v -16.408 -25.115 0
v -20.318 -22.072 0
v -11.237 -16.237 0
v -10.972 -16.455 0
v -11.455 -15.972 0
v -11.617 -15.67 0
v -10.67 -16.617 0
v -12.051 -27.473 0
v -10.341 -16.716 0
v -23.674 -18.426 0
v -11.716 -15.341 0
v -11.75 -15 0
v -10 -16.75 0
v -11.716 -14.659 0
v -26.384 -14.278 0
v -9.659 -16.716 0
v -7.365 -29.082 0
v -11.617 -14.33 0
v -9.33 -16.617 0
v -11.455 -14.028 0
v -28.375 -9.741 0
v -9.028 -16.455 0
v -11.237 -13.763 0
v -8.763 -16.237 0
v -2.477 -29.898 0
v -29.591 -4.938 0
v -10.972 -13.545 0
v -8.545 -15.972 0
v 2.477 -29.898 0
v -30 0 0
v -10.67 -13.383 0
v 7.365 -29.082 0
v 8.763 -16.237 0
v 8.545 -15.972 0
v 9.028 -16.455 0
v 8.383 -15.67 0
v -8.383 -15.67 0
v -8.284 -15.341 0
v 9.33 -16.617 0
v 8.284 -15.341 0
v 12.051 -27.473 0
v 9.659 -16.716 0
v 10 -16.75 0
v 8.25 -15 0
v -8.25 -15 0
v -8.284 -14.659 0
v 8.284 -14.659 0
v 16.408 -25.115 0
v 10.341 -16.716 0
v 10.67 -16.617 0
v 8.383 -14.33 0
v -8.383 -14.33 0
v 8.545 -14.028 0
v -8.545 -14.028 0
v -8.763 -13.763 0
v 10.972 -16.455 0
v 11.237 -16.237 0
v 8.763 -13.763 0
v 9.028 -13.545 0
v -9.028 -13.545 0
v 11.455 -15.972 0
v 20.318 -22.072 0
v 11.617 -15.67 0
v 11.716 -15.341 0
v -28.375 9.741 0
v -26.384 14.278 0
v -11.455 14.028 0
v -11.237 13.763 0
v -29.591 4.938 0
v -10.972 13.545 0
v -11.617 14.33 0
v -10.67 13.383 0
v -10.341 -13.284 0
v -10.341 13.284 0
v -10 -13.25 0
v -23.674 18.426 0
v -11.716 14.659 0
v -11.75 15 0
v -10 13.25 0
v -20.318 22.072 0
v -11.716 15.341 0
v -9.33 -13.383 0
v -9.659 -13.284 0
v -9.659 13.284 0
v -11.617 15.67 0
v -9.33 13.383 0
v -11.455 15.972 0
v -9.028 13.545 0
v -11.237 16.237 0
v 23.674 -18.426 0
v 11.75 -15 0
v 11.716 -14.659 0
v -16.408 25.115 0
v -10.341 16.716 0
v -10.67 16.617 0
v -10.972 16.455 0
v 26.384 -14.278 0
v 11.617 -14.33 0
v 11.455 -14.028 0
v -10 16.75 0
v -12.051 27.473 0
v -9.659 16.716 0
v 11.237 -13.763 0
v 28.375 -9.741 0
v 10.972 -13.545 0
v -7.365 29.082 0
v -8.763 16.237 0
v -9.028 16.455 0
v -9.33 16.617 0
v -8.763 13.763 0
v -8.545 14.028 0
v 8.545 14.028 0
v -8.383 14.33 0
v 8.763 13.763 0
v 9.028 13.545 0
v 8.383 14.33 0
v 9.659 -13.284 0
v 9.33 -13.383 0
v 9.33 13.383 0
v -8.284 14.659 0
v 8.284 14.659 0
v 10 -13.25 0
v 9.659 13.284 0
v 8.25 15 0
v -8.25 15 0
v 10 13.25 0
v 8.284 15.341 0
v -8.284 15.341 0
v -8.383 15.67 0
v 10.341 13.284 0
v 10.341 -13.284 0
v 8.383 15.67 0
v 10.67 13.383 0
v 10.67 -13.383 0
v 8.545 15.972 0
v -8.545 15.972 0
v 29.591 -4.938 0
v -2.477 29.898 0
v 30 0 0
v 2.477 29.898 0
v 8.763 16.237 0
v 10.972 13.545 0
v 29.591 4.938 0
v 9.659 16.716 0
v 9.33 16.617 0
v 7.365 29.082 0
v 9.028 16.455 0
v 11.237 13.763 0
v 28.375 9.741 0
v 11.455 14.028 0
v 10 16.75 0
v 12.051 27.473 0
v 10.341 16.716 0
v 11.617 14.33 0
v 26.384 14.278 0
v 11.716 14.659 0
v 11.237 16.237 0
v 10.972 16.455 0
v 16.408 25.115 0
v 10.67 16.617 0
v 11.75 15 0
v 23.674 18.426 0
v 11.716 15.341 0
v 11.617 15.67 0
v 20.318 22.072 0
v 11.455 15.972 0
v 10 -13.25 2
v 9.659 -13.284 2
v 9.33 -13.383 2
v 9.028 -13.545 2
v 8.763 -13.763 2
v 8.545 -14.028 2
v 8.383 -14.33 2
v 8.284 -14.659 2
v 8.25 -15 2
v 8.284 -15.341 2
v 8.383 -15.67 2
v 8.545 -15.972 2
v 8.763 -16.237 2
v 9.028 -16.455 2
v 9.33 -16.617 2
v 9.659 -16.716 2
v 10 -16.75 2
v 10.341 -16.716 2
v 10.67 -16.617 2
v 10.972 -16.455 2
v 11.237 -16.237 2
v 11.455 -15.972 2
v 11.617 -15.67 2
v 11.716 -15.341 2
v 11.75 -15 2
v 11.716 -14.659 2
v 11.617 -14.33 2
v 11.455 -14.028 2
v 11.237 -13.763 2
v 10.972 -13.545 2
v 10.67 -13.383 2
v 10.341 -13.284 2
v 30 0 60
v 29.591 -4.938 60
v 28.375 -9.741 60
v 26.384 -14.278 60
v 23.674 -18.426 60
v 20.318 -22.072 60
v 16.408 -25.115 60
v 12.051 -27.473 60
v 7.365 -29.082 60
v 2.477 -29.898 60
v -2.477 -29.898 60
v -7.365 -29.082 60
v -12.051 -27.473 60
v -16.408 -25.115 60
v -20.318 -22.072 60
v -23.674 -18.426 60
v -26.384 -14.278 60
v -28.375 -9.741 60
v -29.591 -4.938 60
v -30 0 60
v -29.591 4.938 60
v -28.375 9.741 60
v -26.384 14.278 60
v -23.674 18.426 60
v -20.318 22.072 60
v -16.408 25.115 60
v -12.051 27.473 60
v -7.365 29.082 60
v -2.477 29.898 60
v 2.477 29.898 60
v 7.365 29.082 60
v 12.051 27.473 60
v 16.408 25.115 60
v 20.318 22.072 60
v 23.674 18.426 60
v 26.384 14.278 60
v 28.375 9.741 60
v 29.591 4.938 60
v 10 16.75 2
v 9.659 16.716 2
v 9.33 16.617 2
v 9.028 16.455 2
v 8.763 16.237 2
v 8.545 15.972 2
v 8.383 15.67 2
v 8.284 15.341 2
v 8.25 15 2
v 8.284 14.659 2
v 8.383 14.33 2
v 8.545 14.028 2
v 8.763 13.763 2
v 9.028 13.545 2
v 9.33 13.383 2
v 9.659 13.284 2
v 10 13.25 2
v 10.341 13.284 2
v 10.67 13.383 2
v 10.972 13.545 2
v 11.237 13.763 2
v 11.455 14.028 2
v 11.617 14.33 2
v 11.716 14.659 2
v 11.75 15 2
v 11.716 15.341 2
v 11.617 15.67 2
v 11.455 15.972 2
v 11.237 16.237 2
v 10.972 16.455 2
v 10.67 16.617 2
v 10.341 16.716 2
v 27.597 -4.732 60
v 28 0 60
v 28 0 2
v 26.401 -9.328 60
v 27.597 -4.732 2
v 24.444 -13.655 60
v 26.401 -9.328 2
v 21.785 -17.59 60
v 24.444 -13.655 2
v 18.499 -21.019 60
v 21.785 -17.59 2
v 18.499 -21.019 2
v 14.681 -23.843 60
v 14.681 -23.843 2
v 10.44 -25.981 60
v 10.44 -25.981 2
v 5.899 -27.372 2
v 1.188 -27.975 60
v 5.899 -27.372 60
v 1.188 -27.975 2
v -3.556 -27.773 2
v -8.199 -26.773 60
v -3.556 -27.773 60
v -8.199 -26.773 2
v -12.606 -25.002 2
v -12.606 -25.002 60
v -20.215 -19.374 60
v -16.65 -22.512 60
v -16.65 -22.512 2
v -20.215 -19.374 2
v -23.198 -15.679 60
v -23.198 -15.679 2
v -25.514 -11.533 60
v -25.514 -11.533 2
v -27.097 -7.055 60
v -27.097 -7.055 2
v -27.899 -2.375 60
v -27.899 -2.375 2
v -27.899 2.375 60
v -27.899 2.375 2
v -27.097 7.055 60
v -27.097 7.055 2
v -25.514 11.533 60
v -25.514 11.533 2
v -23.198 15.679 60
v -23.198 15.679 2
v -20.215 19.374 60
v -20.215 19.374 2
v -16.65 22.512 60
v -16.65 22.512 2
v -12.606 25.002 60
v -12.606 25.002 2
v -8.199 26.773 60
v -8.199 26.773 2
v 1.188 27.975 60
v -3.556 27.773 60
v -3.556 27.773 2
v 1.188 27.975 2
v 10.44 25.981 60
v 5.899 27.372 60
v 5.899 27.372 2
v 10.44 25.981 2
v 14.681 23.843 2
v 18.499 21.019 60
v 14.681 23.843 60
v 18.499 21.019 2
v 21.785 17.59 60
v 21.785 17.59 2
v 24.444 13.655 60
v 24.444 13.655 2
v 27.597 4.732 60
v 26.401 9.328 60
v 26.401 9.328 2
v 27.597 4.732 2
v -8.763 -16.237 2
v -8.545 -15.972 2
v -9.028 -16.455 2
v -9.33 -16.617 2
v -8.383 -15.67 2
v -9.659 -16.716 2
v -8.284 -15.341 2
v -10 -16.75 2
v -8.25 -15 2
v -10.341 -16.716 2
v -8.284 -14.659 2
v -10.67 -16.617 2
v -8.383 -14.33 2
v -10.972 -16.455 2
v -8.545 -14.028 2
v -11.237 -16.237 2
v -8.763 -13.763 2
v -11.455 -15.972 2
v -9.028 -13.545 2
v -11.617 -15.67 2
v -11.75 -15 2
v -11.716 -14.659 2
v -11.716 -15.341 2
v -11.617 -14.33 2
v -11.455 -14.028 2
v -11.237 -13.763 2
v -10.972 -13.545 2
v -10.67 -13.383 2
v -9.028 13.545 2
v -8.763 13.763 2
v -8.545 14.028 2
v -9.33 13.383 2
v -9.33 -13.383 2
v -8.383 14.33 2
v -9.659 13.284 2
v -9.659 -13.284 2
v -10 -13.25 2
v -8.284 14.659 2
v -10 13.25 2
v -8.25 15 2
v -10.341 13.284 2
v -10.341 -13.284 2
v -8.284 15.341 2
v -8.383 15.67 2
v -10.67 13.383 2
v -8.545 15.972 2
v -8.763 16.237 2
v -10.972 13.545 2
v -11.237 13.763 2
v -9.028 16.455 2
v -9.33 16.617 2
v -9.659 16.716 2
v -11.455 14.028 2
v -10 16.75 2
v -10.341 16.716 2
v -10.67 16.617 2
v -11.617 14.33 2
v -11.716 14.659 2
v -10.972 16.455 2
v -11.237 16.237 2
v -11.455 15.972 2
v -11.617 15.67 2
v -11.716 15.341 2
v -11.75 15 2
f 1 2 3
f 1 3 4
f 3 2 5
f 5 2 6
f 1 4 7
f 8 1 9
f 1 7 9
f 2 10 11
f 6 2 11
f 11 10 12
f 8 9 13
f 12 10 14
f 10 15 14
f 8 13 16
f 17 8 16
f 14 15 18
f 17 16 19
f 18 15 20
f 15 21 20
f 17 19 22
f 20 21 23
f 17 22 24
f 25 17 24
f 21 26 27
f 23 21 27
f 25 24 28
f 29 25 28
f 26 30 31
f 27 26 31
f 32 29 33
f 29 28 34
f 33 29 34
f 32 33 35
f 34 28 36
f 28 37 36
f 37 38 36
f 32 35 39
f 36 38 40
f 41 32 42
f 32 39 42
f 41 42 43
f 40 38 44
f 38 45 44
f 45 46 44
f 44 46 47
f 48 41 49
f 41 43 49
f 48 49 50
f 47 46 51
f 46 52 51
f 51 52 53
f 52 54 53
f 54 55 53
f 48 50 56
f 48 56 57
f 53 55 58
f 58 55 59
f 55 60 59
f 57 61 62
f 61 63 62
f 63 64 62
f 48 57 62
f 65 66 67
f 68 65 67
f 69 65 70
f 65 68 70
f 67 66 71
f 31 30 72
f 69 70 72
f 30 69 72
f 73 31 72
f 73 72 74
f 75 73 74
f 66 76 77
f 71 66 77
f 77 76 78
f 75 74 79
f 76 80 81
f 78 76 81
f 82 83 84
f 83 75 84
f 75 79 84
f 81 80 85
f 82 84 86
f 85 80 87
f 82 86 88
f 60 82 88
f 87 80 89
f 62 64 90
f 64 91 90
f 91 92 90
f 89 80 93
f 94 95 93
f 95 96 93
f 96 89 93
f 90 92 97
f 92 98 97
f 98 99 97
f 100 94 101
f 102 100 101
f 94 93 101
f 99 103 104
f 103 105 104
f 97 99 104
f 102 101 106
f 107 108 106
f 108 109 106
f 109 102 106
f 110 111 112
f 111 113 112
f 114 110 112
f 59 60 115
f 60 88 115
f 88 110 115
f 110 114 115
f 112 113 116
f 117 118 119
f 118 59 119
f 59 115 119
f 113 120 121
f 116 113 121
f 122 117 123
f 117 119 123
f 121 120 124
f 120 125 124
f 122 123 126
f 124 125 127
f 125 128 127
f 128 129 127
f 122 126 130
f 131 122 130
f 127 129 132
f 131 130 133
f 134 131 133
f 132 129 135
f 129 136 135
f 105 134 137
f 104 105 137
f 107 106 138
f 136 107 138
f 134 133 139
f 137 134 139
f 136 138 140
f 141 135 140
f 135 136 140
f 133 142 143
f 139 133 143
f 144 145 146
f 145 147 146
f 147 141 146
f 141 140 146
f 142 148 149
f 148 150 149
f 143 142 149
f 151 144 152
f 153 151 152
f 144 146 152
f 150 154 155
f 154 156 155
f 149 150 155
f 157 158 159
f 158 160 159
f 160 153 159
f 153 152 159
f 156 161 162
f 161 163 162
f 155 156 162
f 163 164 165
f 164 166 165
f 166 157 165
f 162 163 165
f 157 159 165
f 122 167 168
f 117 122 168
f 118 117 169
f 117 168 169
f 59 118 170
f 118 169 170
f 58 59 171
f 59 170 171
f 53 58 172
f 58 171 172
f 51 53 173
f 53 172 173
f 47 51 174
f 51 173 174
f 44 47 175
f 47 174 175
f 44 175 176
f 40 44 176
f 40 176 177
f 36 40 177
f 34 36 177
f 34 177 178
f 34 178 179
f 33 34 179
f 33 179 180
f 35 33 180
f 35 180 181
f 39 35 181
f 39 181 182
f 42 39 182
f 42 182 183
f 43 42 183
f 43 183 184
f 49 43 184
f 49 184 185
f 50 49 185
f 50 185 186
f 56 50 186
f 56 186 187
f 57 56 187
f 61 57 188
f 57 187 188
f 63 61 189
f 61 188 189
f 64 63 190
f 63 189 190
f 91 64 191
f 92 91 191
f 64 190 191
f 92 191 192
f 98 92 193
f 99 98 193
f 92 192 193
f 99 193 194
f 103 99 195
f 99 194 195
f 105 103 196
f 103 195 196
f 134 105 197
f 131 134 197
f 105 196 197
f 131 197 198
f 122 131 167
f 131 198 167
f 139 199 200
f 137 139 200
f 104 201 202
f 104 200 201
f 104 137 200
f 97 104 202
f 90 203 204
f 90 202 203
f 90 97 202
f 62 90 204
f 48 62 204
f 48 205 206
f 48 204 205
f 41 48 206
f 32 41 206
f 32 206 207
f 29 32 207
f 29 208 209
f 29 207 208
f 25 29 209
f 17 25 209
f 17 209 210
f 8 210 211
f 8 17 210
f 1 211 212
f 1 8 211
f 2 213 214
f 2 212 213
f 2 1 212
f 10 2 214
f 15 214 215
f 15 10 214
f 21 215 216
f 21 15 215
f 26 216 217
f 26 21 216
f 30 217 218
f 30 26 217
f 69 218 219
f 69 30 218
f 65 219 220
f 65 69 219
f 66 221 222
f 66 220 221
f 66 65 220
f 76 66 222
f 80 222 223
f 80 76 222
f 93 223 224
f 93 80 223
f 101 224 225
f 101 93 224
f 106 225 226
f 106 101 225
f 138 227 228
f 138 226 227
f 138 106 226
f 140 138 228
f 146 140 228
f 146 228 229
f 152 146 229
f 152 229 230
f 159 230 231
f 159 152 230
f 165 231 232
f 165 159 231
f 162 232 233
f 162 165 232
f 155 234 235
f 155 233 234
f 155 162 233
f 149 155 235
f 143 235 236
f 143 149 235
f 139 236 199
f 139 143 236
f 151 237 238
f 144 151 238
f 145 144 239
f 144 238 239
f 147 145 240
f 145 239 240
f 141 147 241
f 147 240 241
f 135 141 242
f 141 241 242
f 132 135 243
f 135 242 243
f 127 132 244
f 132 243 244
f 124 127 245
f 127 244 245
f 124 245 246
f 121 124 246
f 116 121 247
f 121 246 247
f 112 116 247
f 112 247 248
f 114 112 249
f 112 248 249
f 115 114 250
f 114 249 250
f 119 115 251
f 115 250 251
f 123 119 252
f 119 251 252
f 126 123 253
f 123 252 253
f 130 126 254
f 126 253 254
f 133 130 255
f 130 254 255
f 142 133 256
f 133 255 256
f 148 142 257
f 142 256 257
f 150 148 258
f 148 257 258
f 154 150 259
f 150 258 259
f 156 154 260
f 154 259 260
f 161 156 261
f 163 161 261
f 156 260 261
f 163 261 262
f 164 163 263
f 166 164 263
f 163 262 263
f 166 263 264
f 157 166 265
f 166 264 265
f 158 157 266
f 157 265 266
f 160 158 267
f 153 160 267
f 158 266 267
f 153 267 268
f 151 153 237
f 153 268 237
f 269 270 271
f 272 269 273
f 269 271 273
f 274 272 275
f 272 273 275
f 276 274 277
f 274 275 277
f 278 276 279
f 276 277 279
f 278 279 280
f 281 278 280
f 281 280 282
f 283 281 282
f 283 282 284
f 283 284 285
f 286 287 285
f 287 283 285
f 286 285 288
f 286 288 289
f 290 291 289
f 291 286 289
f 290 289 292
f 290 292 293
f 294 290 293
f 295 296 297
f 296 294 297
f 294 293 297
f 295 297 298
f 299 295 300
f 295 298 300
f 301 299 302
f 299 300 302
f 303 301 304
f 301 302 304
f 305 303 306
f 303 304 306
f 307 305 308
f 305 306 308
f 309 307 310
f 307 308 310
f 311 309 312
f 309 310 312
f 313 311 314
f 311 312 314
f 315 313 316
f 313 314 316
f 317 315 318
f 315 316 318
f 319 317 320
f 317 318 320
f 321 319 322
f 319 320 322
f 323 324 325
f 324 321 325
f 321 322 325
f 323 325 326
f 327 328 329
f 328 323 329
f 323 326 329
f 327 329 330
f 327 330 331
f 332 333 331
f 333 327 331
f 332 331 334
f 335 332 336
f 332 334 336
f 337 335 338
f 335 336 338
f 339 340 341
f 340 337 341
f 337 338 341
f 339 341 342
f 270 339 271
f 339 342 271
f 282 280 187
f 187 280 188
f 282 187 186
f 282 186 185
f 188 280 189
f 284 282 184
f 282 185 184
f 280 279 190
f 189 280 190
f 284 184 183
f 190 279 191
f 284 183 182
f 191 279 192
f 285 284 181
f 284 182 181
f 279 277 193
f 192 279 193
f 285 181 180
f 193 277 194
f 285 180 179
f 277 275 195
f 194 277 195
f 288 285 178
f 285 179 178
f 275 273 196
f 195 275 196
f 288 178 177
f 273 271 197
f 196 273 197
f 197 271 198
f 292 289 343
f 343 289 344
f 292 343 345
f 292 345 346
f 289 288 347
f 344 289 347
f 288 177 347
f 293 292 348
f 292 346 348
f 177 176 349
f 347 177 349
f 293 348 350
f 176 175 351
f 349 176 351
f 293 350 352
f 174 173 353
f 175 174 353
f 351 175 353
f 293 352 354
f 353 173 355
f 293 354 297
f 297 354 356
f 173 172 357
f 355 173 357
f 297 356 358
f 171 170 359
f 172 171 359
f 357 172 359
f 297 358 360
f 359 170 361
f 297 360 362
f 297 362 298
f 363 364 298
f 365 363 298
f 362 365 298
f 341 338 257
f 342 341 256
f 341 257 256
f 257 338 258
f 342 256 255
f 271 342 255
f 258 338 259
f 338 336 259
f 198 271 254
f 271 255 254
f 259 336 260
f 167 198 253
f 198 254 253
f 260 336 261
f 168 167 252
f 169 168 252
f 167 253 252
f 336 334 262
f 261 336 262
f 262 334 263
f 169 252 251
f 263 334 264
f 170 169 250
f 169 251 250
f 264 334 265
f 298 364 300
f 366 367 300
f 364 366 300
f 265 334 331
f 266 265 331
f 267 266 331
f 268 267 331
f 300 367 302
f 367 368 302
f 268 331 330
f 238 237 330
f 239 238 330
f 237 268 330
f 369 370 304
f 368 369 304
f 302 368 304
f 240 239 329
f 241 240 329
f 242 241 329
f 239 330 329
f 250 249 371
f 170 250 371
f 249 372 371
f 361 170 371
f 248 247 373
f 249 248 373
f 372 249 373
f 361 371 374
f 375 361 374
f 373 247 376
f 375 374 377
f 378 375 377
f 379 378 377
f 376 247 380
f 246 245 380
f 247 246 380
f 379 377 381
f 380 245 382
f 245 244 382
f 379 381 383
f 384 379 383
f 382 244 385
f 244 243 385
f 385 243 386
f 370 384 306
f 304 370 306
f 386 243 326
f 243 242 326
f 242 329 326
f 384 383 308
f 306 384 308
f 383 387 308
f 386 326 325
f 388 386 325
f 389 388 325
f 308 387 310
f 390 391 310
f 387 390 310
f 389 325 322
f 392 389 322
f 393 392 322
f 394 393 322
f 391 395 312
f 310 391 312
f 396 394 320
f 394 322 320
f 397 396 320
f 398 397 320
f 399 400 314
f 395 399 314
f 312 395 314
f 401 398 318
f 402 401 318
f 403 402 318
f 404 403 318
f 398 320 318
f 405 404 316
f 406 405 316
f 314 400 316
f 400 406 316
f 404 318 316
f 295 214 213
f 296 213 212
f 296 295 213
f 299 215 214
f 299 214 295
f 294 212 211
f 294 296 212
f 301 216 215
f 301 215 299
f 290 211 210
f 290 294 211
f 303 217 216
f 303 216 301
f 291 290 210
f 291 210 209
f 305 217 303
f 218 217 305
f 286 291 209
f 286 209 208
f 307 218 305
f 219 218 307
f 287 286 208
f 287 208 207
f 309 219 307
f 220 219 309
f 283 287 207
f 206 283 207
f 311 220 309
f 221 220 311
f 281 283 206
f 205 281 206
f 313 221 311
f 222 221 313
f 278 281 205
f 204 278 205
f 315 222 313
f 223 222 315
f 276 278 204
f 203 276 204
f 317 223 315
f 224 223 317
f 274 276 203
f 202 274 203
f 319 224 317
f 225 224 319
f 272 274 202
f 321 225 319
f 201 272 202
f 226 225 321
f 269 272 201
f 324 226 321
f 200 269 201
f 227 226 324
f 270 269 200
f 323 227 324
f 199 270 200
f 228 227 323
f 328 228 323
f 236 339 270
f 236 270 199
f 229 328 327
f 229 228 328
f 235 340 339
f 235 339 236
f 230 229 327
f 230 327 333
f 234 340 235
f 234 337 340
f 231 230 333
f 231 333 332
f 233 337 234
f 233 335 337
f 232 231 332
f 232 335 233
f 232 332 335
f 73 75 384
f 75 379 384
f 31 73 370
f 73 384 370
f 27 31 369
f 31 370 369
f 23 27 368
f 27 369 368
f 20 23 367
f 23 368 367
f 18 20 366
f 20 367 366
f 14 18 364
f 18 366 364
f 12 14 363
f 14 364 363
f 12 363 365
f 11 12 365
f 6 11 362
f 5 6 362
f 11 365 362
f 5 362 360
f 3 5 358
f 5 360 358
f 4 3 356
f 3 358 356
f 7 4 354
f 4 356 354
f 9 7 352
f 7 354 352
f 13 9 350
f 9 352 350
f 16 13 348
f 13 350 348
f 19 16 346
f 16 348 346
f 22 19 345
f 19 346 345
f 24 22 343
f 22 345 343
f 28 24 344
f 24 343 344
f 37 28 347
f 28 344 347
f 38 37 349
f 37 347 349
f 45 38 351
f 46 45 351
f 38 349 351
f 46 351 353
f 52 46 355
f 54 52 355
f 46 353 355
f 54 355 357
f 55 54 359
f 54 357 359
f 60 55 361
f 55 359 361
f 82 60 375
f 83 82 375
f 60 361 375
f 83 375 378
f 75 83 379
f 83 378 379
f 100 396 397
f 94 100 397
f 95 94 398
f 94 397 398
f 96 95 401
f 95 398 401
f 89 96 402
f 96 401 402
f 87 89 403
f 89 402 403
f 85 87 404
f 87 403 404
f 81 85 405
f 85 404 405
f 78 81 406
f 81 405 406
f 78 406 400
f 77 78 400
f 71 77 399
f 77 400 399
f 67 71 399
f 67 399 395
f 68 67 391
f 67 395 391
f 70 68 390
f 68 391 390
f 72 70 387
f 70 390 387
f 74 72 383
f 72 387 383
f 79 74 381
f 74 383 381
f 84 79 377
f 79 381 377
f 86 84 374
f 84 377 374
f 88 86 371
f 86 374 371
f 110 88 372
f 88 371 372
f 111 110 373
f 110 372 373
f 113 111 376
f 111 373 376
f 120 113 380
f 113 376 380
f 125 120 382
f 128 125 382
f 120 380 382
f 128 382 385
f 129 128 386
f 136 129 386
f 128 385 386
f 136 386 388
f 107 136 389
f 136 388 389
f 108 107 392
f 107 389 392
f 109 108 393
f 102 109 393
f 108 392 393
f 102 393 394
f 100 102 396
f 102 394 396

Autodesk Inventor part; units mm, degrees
ref_plane "YZ Plane" through (0, 0, 0) normal (1, 0, 0) x (0, 1, 0)
ref_plane "XZ Plane" through (0, 0, 0) normal (0, 1, 0) x (-1, 0, 0)
ref_plane "XY Plane" through (0, 0, 0) normal (0, 0, 1) x (1, 0, 0)
sketch "スケッチ1" plane through (0, 0, 0) normal (0, 0, 1) x (1, 0, 0)
  circle A0 centre (0, 0) radius 30
  circle A1 centre (0, 0) radius 28
  dimension "d0" = 60
  dimension "d21" = 2
extrude "押し出し1" add sketch "スケッチ1" along normal blind 60
sketch "スケッチ6" plane through (0, 0, 0) normal (0, 0, -1) x (-1, 0, 0)
  circle A0 centre (0, 0) radius 28 projected
extrude "押し出し5" add sketch "スケッチ6" against normal blind 2
sketch "スケッチ7" plane through (0, 0, 0) normal (0, 0, -1) x (-1, 0, 0)
  line L0 (0, 0) -> (-30, 0)
  circle A0 centre (0, 0) radius 30 projected
  line L1 (0, 0) -> (0, 30)
  point P0 (-10, -15)
  point P1 (-10, 15)
  point P2 (10, -15)
  point P3 (10, 15)
  dimension "d24" = 20
  dimension "d25" = 30
hole "穴2" at (10, -15, 0) at (10, 15, 0) at (-10, -15, 0) at (-10, 15, 0) direction (0, 0, 1) diameter 3.5 end through all
properties part number "筒"
